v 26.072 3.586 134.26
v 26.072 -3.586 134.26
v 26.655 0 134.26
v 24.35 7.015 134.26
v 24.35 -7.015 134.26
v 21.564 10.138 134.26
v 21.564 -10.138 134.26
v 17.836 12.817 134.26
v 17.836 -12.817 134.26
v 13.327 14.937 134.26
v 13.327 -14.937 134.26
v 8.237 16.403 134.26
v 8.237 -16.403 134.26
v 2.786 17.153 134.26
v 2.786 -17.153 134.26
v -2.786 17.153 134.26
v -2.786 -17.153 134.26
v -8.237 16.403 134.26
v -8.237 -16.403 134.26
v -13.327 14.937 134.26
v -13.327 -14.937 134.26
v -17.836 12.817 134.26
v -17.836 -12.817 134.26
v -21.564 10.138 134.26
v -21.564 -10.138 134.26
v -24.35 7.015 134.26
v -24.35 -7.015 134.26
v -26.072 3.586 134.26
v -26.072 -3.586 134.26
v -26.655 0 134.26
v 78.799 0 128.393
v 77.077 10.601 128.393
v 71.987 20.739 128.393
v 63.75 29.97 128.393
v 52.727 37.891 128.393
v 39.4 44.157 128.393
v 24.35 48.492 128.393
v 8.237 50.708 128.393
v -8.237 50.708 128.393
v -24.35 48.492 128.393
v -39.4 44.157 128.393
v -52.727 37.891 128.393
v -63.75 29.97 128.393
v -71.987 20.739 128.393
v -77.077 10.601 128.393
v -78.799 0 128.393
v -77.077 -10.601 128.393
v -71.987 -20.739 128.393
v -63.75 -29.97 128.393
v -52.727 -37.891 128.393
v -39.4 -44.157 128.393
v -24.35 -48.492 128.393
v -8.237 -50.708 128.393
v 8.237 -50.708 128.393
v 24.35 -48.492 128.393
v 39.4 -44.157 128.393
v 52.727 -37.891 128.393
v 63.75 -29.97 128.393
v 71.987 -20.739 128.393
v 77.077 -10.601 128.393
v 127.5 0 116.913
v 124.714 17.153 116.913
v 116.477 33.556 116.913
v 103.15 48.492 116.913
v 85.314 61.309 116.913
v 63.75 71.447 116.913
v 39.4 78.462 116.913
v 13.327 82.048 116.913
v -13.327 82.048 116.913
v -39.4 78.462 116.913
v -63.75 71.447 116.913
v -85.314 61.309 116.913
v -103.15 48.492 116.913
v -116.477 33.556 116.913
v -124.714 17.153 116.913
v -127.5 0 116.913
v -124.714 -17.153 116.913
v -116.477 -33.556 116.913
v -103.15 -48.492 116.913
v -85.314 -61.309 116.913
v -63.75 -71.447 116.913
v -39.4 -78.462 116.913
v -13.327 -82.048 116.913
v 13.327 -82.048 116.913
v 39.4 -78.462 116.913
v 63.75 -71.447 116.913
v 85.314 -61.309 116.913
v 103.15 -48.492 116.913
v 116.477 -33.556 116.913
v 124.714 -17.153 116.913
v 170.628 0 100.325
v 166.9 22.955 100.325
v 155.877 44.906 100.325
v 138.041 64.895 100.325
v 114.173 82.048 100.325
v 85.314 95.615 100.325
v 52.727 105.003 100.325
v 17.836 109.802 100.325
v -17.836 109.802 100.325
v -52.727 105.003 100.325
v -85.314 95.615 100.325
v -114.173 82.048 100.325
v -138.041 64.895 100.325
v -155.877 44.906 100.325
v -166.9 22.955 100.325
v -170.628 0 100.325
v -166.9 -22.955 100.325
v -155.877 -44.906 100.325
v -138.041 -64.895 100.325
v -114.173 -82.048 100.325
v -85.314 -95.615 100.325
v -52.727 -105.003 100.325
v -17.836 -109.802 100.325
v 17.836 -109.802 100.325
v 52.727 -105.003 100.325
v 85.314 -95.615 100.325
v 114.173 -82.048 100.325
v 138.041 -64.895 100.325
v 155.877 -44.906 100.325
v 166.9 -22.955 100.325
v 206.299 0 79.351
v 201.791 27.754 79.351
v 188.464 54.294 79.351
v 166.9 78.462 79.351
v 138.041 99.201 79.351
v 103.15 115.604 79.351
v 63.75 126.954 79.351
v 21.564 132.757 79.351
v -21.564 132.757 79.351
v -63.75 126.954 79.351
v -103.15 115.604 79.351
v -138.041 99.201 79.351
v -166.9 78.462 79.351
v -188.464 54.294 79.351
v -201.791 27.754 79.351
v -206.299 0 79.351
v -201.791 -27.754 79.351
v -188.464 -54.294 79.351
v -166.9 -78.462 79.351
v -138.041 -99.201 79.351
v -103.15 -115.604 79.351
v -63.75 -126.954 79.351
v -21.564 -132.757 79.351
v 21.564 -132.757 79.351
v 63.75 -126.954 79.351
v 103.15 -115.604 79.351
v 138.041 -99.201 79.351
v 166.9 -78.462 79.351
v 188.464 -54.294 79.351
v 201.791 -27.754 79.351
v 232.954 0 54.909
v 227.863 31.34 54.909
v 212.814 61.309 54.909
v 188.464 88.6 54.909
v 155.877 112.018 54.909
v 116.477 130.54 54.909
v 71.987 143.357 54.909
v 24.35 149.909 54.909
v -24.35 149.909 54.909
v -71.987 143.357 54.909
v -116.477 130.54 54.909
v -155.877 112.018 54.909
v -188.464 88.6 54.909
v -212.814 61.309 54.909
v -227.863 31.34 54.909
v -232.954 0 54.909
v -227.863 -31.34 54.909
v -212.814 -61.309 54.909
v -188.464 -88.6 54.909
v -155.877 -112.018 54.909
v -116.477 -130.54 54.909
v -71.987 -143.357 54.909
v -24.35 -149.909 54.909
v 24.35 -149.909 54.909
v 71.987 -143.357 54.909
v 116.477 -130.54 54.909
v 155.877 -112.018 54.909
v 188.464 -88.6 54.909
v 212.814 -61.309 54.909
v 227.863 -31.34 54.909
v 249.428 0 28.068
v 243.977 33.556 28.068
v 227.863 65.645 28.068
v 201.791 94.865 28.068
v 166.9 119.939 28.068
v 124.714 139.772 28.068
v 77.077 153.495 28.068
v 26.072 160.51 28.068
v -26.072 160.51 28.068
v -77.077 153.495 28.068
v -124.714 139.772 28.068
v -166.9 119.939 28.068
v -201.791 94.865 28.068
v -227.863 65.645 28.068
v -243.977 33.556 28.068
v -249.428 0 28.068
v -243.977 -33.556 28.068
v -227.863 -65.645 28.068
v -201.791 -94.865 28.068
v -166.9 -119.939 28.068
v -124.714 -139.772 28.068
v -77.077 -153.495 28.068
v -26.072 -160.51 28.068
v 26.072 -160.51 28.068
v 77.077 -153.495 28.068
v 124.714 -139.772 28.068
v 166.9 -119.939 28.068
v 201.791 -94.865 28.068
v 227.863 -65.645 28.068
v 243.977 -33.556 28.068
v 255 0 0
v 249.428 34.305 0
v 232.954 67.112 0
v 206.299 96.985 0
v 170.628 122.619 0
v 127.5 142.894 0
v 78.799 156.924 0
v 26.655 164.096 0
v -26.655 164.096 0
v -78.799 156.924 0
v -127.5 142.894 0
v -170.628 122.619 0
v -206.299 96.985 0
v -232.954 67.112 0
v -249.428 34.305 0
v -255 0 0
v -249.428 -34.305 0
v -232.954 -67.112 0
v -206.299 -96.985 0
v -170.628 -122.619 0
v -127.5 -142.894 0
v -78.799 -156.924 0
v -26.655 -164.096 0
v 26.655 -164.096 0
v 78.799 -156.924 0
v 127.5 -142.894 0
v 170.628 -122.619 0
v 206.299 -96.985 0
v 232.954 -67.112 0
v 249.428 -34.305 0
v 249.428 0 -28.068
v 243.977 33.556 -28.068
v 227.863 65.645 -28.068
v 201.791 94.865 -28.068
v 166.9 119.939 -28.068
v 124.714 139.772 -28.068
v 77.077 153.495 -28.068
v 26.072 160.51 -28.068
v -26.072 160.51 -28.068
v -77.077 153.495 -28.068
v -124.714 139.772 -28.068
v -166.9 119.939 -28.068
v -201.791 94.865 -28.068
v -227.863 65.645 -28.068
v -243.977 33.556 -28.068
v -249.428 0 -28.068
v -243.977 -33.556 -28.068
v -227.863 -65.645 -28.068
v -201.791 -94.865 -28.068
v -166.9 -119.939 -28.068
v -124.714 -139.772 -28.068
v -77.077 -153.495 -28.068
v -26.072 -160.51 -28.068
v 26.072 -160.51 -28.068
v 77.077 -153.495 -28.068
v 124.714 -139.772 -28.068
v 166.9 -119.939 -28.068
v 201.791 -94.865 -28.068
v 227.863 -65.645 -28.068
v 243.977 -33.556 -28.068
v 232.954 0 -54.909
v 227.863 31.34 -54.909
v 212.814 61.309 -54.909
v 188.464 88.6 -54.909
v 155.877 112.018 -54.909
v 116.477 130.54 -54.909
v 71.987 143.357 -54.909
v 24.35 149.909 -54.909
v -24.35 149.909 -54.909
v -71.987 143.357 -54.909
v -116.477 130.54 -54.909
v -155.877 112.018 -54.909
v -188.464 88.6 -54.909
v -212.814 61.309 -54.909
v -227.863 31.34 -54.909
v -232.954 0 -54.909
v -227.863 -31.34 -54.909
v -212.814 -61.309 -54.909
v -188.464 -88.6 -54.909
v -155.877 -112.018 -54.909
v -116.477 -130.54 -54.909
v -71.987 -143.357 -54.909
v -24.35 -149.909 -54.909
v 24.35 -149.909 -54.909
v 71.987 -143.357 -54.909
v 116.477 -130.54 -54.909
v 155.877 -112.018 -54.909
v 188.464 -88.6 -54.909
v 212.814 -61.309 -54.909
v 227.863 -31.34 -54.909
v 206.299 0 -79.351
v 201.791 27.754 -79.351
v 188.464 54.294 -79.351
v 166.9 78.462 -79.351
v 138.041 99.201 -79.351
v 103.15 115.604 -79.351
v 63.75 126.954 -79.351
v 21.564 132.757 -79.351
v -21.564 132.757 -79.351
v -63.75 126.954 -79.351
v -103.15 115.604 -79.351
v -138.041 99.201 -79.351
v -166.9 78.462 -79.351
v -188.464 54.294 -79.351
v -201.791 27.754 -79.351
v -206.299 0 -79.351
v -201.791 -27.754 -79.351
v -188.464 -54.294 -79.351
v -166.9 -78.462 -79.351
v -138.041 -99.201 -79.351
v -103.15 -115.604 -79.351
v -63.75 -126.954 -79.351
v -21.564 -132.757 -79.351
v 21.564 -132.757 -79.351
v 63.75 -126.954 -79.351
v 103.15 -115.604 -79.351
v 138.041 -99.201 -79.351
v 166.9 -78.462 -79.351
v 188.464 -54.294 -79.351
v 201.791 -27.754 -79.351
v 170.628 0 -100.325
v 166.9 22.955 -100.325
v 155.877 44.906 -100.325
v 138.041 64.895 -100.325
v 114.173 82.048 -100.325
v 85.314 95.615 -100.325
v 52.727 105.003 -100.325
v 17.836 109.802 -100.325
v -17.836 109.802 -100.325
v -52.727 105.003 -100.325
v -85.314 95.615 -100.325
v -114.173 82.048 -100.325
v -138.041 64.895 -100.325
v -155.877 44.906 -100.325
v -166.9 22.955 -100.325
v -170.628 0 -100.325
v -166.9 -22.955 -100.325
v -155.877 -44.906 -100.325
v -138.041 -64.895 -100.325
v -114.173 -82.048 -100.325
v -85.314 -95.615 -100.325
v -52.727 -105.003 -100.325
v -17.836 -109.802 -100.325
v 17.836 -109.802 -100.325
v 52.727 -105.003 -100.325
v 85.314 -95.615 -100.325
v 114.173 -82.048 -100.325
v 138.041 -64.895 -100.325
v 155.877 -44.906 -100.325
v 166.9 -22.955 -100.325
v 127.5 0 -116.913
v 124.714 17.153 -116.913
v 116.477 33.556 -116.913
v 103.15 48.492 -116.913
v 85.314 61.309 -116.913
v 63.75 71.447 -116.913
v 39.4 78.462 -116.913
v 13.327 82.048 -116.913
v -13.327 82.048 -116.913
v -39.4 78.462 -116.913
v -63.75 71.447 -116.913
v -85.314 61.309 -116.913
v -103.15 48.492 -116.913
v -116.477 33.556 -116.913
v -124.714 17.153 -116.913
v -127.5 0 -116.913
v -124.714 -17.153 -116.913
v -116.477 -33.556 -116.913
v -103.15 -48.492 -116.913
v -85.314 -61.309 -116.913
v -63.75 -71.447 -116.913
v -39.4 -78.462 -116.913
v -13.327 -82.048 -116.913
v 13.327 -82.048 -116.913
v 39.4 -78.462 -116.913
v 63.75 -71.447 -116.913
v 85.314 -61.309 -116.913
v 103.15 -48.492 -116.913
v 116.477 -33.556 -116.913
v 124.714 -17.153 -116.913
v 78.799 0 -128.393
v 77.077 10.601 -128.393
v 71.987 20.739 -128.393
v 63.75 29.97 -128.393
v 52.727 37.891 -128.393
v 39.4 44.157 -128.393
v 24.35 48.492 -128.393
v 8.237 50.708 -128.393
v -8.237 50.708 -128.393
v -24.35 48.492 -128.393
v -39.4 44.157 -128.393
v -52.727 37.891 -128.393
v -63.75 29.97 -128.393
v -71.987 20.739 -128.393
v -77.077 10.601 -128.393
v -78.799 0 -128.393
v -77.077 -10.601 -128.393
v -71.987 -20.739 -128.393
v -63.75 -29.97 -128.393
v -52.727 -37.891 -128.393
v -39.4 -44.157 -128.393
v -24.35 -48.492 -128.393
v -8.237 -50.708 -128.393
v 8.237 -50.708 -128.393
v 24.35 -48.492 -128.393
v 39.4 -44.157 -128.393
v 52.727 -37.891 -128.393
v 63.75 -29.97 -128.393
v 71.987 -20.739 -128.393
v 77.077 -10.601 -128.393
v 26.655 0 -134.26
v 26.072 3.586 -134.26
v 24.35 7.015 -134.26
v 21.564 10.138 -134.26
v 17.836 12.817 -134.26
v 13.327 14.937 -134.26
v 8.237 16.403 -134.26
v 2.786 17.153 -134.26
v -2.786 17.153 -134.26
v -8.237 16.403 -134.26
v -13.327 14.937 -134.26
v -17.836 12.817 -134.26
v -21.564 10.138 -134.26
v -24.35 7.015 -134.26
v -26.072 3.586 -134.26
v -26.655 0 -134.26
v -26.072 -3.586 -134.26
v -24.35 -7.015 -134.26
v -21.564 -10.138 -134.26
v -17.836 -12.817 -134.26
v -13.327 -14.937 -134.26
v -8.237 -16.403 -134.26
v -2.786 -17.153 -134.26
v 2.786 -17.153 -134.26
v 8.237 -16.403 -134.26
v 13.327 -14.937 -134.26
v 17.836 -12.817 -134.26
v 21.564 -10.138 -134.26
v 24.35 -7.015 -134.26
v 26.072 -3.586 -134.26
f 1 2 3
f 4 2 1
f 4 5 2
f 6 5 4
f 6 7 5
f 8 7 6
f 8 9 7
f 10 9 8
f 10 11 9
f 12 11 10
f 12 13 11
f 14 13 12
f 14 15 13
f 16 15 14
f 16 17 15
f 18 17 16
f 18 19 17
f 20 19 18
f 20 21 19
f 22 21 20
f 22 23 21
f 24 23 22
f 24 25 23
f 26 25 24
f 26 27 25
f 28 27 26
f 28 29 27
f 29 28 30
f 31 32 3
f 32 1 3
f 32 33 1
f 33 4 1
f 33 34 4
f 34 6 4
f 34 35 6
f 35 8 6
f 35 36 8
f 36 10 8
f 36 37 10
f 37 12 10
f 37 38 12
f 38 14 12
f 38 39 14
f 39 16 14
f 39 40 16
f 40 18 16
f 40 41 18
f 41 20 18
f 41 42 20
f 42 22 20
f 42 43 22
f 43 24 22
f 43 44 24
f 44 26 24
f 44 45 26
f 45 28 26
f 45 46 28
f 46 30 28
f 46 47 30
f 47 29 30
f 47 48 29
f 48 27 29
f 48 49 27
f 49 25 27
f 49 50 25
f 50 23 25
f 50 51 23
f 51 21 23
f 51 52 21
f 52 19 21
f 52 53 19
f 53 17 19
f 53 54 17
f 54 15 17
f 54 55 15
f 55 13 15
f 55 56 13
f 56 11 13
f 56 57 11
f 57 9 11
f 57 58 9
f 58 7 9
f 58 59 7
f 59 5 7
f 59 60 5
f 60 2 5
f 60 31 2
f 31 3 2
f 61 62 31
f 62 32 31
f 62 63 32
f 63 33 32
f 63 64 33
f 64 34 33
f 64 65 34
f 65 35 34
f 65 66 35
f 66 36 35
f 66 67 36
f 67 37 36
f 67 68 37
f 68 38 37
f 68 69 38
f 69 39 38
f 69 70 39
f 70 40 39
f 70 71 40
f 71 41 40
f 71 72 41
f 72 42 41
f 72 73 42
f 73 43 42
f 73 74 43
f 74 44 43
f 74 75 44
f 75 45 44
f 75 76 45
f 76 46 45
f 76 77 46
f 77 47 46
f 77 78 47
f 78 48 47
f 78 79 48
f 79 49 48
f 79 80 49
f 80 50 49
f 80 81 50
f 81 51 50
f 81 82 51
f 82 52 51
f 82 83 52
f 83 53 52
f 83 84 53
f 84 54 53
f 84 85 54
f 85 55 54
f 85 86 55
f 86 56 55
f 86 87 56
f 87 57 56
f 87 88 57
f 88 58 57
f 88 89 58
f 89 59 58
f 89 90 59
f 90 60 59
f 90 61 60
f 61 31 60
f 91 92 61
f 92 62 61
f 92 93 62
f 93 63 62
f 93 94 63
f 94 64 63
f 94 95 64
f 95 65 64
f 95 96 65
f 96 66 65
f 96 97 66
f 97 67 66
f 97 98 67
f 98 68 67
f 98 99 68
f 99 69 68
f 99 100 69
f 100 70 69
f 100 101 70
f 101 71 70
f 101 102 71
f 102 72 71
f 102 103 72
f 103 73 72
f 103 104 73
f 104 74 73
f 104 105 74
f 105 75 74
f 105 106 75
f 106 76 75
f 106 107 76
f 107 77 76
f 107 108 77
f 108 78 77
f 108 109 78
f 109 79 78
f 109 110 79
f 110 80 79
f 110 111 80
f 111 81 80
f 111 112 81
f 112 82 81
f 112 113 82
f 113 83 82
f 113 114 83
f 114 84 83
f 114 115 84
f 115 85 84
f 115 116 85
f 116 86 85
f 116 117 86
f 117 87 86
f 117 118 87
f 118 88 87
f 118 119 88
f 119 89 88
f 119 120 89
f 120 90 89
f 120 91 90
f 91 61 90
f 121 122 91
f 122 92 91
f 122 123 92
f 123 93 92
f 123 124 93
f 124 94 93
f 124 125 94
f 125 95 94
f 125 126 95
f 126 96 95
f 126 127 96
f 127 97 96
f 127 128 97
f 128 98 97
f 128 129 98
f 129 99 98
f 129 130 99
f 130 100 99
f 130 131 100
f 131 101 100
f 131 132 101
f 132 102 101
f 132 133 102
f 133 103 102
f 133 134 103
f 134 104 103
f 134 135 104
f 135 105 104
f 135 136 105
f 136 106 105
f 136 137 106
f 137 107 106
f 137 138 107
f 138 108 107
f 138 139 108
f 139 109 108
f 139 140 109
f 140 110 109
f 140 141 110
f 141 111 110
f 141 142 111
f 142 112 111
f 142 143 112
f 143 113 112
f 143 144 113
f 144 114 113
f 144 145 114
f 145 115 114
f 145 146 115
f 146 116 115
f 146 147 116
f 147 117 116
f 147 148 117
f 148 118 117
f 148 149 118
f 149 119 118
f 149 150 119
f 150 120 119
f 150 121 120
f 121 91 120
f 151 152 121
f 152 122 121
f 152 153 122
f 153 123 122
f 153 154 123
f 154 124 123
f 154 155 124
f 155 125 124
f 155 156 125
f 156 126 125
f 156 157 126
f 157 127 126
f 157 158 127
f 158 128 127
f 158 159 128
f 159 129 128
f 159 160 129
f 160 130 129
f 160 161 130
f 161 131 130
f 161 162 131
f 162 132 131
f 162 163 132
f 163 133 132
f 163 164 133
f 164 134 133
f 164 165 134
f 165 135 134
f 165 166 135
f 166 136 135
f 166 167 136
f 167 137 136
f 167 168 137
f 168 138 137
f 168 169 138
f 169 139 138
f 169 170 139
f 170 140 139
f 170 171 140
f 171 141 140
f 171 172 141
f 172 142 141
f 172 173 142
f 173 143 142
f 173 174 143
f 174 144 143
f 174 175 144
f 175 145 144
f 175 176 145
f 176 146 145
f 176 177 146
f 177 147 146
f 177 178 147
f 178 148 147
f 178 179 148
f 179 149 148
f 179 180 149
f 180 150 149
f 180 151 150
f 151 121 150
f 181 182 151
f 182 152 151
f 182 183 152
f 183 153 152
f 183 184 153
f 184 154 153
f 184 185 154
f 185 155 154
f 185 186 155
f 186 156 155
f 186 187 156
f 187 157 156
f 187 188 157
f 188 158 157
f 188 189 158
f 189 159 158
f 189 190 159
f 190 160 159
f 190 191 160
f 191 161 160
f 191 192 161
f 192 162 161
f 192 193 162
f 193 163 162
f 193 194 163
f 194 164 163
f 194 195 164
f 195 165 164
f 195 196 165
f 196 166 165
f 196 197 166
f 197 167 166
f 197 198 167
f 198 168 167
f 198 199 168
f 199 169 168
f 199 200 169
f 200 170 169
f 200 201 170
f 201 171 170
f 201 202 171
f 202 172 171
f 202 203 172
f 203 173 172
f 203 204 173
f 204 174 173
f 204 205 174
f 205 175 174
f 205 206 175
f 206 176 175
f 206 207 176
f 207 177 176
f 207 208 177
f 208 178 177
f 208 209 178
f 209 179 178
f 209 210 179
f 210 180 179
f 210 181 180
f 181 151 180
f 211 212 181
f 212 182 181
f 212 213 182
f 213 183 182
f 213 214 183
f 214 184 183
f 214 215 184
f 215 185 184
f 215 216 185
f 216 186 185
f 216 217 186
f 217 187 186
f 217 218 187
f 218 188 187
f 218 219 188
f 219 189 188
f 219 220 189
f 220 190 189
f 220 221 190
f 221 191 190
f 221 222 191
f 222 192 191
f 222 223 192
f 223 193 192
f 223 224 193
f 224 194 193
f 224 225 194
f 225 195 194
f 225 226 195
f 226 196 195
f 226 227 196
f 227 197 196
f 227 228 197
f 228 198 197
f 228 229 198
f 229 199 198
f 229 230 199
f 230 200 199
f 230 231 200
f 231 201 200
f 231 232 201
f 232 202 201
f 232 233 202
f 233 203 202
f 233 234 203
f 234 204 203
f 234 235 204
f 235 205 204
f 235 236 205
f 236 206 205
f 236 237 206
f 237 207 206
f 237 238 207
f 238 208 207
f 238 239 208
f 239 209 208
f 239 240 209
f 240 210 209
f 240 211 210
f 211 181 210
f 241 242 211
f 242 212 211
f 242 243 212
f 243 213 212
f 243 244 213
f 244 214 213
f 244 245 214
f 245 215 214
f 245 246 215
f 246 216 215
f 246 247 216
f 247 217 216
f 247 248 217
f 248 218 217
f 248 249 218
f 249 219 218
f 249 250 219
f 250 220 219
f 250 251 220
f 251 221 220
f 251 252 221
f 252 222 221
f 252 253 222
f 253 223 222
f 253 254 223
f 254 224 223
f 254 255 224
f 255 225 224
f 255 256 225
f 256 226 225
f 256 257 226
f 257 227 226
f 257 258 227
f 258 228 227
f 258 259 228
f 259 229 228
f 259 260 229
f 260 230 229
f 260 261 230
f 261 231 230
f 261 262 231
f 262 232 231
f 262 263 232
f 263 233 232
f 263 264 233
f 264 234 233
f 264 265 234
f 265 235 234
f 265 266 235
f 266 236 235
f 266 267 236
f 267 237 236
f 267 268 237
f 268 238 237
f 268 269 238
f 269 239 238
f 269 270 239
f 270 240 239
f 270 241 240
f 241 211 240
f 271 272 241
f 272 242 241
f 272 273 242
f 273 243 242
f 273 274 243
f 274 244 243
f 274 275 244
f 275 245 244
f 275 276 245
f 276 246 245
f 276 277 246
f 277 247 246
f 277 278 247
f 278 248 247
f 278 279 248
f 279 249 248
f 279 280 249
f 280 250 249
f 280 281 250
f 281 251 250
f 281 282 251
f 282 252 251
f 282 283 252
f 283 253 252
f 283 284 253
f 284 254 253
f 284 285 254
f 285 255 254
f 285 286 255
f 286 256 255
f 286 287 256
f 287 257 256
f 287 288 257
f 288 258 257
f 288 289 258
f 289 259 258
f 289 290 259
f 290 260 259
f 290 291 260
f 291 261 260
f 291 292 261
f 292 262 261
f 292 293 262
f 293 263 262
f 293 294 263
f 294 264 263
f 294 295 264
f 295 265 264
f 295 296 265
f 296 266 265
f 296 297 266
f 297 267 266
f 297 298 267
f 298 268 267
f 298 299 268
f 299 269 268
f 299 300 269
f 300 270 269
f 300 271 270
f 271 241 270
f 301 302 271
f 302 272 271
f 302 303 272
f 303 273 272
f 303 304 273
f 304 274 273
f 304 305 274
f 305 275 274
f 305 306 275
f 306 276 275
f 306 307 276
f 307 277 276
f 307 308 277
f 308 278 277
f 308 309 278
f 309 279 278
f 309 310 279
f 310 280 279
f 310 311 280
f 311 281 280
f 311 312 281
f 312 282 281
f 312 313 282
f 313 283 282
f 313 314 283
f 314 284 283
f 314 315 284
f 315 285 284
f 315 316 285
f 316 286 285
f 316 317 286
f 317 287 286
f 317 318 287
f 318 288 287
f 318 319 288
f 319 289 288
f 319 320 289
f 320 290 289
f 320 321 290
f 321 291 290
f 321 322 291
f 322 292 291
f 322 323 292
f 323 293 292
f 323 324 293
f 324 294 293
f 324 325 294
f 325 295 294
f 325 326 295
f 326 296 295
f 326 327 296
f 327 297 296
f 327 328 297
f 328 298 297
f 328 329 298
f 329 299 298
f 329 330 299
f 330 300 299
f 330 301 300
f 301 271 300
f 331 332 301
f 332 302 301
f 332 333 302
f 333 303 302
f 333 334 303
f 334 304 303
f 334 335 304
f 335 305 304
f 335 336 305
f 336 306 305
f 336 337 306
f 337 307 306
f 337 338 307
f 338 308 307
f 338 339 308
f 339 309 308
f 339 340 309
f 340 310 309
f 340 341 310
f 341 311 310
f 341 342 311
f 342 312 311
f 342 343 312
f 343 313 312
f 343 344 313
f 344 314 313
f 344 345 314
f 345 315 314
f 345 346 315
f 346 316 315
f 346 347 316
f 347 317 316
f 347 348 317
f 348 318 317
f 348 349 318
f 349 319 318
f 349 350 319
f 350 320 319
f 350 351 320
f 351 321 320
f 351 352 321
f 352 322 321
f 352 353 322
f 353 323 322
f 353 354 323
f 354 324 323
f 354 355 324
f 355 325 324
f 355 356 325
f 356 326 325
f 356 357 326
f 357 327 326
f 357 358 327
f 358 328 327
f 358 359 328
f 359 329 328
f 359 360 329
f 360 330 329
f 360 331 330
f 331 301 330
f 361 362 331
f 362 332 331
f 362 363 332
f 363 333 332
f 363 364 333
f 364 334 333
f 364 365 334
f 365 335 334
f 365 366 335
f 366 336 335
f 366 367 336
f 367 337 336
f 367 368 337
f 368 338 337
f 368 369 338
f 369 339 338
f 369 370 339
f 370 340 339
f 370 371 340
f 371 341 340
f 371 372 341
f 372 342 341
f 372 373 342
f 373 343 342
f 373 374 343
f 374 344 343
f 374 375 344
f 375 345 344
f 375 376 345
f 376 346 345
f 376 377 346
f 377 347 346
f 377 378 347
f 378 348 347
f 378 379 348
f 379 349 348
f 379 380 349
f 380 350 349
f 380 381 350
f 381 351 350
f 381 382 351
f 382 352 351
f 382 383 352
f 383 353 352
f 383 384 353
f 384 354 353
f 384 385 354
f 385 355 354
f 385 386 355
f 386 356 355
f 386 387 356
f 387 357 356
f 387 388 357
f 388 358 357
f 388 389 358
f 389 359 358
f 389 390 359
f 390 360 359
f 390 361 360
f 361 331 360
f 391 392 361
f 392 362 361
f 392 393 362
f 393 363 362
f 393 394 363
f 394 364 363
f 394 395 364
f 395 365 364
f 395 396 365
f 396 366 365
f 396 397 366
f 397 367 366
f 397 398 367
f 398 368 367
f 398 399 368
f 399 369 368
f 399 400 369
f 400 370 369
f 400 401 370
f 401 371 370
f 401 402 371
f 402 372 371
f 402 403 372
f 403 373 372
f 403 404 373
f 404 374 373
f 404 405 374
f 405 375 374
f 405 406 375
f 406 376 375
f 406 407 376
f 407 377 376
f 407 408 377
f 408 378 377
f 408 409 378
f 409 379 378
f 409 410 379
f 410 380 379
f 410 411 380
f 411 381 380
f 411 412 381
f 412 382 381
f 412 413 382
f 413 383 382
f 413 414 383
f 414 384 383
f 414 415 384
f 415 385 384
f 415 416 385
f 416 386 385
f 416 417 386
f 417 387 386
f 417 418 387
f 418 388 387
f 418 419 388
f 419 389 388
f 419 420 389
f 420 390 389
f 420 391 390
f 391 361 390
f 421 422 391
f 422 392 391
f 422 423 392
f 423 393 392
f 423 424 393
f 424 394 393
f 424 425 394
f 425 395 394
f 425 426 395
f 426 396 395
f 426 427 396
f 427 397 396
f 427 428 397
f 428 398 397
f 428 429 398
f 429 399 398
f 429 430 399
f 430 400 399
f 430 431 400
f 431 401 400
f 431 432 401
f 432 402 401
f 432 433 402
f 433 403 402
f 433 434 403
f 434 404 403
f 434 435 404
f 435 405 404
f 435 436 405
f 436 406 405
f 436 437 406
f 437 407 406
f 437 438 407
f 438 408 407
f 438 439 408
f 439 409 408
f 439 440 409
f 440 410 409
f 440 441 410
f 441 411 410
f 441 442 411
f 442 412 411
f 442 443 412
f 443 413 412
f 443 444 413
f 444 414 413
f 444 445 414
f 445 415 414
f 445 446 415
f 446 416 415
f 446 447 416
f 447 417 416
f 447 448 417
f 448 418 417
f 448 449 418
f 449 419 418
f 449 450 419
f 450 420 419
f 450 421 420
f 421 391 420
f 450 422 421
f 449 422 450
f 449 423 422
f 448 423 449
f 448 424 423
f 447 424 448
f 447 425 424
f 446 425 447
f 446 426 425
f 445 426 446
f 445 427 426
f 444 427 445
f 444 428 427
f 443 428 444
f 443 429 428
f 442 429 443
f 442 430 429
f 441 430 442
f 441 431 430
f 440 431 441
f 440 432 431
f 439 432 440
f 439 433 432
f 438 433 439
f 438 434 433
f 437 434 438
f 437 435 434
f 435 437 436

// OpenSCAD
// Generated by SolidPython 1.0.1 on 2020-07-29 00:46:53


scale(v = [17, 11, 9]) {
	sphere(r = 15);
}
/***********************************************
*********      SolidPython code:      **********
************************************************
 
# import packages: SolidPython
from solid import *
from solid.utils import *
from itertools import chain, combinations, permutations


class Resize:

    def __init__(self, scad_file):
        self.scad_file = scad_file
        #self.scad_file = import_scad(scad_file)
        # cone/cylinder param:
        self.r1 = 0
        self.r2 = 0
        self.h = 0
        # rectangular prism param:
        self.w = 0
        self.l = 0
        # ellipse param:
        self.r = 0

    # import OpenScad code (file name corresponds to shape)


    # classify shape + parameters
    def assign(self, param1, param2, param3):
        if self.scad_file == 'cone.scad':
            self.r1 = param1
            self.r2 = param2
            self.h = param3
        elif self.scad_file == 'cylinder.scad':
            self.r1 = param1
            self.r2 = param2
            self.h = param3
        elif self.scad_file == 'rectangularPrism.scad':
            self.h = param1
            self.l = param2
            self.w = param3
        else:
            self.r = param1
            self.h = param2

    # resize parameters
    def iterate(self):
        x = range(3, 20, 2)
        i = 1
        if self.scad_file == 'cone.scad':
            tempList = list(permutations(x, 2))
            for temp in tempList:
                param1 = temp[0]
                param2 = temp[1]
                filepath = 'produced_scad_files/' + 'cone' + str(param1) + '_' + str(param2) + '_' + '.scad'
                scad_render_to_file(cylinder(h=param1, r1=param2, r2=0), filepath)

        elif self.scad_file == 'cylinder.scad':
            tempList = list(permutations(x, 3))
            for temp in tempList:
                param1 = temp[0]
                param2 = temp[1]
                filepath = 'produced_scad_files/' + 'cylinder' + str(param1) + '_' + str(param2) + '_' + '.scad'
                scad_render_to_file(cylinder(h=param1, r1=param2, r2=param2), filepath)

        elif self.scad_file == 'rectangularPrism.scad':
            tempList = list(permutations(x, 3))
            for temp in tempList:
                param1 = temp[0]
                param2 = temp[1]
                param3 = temp[2]
                filepath = 'produced_scad_files/' + 'rectangularPrism' + str(param1) + '_' + str(param2) + '_' + str(
                    param3) + '.scad'
                scad_render_to_file(cube(size=(param1, param2, param3)), filepath)

        elif self.scad_file == 'ellipse.scad':
            tempList = list(permutations(x, 4))
            for temp in tempList:
                param1 = temp[0]
                param2 = temp[1]
                param3 = temp[2]
                param4 = temp[3]
                filepath = 'produced_scad_files/' + 'ellipse' + str(param1) + '_' + str(param2) + '_' + str(param3) + '_' + str(param4) + '.scad'
                scad_render_to_file(scale([param1, param2, param3])(sphere(r=param4)), filepath)

    def render_to_scadfile(self):
        scad_render_to_file(scad, 'example.scad') 
 
************************************************/
